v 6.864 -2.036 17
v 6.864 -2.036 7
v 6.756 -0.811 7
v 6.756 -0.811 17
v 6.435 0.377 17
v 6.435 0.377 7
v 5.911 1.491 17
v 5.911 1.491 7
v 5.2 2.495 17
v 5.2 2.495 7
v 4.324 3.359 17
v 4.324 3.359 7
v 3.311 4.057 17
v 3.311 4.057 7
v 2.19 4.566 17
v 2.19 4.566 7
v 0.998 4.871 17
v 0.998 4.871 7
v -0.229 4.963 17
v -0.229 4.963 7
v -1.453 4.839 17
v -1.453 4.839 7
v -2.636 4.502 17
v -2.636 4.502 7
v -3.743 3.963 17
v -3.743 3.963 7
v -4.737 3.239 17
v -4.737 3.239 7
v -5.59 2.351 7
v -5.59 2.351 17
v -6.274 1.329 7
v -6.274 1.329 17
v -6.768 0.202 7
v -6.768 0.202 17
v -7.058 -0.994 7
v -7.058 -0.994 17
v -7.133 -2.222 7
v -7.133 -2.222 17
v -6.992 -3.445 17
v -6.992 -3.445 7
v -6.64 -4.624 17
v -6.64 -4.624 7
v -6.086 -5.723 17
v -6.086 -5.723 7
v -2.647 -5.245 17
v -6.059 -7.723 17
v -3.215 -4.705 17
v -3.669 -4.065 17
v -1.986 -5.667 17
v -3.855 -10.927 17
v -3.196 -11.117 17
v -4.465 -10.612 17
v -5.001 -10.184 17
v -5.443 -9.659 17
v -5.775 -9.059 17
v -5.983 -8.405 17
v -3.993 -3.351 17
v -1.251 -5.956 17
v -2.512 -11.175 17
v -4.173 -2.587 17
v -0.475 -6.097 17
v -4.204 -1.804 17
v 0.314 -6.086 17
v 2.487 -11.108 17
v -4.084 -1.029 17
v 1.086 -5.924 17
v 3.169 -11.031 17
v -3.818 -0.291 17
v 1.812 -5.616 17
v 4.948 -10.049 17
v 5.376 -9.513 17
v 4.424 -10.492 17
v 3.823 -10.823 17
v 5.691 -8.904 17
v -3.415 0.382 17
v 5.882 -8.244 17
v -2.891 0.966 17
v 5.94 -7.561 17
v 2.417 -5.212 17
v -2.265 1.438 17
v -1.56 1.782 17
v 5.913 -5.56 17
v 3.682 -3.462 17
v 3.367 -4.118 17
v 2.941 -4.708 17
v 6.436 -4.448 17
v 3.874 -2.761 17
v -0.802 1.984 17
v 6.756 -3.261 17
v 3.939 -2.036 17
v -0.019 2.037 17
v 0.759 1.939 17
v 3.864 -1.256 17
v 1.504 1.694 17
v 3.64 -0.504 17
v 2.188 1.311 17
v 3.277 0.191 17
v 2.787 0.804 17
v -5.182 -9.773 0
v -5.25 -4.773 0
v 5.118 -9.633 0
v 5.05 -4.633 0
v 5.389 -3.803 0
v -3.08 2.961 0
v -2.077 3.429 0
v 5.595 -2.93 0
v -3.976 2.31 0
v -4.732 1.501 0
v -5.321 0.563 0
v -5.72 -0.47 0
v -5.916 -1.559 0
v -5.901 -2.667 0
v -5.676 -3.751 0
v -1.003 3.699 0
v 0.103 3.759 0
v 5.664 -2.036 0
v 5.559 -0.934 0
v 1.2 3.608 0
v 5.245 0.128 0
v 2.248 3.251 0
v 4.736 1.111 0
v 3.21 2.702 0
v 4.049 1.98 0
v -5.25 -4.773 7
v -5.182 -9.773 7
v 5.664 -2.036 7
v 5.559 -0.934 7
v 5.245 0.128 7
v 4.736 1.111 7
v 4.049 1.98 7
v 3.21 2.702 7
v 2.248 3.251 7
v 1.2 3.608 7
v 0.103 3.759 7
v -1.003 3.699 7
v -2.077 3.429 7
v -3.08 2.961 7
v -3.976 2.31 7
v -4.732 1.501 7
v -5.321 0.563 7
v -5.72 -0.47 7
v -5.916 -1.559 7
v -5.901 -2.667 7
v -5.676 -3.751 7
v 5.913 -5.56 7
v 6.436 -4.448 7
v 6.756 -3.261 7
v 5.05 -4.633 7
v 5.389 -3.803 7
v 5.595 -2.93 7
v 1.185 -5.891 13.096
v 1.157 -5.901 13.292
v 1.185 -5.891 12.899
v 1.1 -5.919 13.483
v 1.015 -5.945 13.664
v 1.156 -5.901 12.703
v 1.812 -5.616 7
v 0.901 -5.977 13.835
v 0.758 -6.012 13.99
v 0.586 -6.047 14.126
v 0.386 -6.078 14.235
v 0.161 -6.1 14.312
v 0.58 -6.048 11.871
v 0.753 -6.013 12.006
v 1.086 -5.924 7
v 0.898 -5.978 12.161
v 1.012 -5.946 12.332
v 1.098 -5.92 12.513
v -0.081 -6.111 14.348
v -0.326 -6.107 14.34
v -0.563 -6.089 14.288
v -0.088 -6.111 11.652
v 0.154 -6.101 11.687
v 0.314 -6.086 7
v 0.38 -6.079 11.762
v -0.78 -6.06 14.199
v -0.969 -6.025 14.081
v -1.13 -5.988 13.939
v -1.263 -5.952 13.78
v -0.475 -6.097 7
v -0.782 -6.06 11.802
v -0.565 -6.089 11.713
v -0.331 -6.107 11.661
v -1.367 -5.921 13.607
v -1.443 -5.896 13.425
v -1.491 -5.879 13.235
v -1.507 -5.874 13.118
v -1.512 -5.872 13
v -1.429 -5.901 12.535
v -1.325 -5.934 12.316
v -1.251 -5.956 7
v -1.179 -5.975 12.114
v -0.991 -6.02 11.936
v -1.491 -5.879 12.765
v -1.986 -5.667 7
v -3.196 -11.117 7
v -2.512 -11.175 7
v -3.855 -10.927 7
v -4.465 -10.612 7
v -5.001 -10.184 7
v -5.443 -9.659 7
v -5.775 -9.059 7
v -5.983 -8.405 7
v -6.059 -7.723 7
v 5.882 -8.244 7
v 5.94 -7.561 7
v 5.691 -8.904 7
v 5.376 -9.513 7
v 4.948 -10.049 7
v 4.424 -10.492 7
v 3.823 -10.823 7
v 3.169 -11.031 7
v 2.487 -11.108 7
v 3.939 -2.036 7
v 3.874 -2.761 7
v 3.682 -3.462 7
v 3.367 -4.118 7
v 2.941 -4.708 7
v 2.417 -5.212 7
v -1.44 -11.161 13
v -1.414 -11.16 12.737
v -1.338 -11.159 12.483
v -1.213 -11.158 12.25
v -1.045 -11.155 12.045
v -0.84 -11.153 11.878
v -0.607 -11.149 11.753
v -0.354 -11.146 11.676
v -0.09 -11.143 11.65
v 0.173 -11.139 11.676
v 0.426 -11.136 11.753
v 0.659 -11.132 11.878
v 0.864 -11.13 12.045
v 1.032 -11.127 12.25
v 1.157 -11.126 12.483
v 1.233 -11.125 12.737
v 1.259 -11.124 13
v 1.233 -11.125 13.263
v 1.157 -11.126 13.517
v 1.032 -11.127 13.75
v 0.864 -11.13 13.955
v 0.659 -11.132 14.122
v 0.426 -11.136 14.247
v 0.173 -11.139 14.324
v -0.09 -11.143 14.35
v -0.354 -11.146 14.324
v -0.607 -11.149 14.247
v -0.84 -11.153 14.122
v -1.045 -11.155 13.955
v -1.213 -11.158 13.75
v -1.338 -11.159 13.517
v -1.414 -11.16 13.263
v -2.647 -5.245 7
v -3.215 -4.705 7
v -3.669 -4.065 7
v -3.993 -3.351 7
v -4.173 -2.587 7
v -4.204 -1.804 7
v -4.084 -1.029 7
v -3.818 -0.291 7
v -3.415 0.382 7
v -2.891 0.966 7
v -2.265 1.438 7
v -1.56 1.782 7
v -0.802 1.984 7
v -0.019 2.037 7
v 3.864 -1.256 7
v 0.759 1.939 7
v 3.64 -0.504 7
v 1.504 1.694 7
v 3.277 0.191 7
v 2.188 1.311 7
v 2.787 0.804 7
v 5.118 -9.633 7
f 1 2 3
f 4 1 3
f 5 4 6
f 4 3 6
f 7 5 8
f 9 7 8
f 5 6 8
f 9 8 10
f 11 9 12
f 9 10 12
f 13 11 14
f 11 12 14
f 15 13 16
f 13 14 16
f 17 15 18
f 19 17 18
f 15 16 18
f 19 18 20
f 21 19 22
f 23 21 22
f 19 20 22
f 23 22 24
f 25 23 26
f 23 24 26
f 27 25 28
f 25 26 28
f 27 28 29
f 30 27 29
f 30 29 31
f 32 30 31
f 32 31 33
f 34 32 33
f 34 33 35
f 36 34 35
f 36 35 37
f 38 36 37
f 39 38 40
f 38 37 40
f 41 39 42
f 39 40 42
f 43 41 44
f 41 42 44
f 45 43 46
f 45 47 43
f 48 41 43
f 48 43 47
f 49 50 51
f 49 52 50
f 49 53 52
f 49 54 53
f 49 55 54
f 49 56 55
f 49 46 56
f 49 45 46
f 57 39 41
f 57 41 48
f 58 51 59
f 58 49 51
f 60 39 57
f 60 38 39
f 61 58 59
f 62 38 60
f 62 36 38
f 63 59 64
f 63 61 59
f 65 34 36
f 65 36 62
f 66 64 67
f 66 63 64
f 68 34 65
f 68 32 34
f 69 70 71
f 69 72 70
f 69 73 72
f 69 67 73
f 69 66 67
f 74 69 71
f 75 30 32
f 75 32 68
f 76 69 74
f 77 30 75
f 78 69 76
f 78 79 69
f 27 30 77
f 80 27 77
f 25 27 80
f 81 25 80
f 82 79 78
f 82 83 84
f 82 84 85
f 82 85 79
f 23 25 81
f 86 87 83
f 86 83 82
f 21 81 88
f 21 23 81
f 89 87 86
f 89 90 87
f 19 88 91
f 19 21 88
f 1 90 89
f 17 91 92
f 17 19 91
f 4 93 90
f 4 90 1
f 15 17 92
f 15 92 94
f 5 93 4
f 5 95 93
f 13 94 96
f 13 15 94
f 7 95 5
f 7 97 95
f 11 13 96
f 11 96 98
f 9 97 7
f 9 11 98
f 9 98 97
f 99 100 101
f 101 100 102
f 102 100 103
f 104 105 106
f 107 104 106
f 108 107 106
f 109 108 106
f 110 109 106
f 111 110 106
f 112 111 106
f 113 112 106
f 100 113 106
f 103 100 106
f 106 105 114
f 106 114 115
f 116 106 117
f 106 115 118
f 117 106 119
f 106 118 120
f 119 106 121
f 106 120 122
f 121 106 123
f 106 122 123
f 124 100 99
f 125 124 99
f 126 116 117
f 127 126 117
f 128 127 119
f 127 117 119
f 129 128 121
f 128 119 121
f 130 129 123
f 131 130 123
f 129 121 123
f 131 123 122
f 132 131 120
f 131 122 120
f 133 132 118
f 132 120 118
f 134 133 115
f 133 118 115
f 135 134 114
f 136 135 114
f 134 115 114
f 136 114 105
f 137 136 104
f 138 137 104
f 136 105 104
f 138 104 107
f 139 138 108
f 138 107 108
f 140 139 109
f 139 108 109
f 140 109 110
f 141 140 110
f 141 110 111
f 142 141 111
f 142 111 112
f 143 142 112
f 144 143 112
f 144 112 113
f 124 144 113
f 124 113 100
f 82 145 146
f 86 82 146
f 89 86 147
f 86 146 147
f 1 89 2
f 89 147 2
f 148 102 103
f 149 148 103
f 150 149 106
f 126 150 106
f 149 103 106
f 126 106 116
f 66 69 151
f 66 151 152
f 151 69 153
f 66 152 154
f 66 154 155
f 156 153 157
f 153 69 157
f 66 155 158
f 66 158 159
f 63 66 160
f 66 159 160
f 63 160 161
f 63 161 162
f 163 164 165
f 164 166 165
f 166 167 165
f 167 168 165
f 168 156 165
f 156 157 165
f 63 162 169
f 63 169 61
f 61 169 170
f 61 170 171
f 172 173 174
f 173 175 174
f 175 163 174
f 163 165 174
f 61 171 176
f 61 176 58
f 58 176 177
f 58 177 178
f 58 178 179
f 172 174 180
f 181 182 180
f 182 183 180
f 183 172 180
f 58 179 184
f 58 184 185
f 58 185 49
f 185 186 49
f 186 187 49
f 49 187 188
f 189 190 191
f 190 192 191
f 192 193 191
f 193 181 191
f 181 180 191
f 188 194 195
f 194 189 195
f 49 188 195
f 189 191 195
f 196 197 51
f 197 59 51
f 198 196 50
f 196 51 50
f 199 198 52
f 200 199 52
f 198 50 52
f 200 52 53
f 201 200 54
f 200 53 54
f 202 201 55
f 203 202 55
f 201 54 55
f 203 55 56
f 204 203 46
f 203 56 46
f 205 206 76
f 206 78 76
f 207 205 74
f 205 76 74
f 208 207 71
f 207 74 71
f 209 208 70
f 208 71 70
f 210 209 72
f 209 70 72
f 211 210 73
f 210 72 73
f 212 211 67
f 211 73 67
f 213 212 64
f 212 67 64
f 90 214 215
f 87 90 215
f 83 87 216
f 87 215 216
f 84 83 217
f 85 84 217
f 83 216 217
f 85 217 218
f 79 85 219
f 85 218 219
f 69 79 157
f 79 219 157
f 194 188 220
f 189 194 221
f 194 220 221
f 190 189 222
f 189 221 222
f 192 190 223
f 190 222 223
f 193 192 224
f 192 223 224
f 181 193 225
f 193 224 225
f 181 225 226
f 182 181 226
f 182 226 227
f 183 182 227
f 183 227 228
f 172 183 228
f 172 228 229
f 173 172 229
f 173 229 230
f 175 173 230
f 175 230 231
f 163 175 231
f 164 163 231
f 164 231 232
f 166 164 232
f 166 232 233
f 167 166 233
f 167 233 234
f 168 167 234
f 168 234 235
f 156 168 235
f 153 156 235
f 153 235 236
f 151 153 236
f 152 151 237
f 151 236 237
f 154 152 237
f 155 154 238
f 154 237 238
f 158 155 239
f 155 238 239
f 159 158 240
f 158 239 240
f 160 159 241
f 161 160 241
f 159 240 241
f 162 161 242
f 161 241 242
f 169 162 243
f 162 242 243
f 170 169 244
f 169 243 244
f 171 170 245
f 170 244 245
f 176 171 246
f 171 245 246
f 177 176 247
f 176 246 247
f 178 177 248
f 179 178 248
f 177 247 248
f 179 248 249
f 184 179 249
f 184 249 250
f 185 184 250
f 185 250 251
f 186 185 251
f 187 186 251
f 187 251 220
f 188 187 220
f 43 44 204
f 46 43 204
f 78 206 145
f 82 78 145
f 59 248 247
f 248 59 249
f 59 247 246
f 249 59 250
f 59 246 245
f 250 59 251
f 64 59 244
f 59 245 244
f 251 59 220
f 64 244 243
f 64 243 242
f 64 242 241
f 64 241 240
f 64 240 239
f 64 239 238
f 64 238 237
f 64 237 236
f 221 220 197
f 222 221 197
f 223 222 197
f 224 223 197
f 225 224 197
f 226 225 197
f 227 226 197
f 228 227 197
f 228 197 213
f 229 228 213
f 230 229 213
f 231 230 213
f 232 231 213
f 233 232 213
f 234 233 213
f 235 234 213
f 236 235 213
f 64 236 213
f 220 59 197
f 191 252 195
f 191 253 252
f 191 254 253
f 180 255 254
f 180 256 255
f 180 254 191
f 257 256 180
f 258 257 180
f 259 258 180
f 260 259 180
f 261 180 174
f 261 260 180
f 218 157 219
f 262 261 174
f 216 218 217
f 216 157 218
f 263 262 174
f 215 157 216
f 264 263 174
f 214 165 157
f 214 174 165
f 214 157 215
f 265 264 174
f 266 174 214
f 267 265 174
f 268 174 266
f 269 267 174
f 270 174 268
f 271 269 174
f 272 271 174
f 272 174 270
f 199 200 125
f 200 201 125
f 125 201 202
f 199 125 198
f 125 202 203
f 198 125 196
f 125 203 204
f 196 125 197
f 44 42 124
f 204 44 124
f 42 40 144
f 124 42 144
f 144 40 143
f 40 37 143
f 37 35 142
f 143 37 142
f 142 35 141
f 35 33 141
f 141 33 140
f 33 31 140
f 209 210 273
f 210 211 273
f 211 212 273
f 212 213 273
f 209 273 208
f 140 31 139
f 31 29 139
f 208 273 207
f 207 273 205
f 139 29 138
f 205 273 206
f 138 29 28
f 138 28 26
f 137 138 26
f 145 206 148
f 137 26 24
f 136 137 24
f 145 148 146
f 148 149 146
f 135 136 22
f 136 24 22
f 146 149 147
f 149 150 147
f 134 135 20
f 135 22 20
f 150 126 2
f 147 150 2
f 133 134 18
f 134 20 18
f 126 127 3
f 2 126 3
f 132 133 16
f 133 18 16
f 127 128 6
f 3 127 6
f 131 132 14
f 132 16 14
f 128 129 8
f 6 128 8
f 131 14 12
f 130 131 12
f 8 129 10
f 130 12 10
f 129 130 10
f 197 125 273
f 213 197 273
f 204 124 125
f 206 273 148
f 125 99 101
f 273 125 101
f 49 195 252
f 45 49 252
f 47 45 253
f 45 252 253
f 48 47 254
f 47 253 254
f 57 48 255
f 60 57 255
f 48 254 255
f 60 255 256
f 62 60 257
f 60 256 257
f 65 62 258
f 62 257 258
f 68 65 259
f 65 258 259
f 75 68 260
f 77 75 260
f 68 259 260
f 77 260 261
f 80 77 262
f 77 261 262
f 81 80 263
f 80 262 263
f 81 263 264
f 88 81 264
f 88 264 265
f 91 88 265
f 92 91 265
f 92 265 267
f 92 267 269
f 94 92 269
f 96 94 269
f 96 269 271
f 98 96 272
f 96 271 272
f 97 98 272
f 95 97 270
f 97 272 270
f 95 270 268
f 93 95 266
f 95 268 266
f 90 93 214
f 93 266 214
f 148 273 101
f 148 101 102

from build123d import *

# Parameters (mm, degrees)
BOSS_EXTRUDE1_DEPTH = 7
BOSS_EXTRUDE3_DEPTH = 10
SKETCH6_R           = 1.35
CUT_EXTRUDE3_DEPTH  = 12
FILLET1_R           = 3.5
FILLET2_R           = 3.5


with BuildPart() as part:
    # Sketch1 → Boss-Extrude1 (new body)
    with BuildSketch(Plane.XY):
        with BuildLine():
            ThreePointArc((5.050452833, -4.633288902), (-0.057176836, -7.835700867), (-5.249547167, -4.77259565))
            Line((-5.249547167, -4.77259565), (-5.181922533, -9.77259565))
            Line((-5.181922533, -9.77259565), (5.118077467, -9.633288902))
            Line((5.118077467, -9.633288902), (5.050452833, -4.633288902))
        make_face()
        with BuildLine():
            ThreePointArc((5.664385761, -2.036231273), (-1.546144107, 3.589638037), (-5.249547167, -4.77259565))
            Line((-5.249547167, -4.77259565), (5.050452833, -4.633288902))
            ThreePointArc((5.050452833, -4.633288902), (5.508816158, -3.370549635), (5.664385761, -2.036231273))
        make_face()
        with BuildLine():
            Line((5.050452833, -4.633288902), (-5.249547167, -4.77259565))
            ThreePointArc((-5.249547167, -4.77259565), (-0.057176836, -7.835700867), (5.050452833, -4.633288902))
        make_face()
    extrude(amount=BOSS_EXTRUDE1_DEPTH)

    # Sketch2 → Boss-Extrude3 (add)
    with BuildSketch(Plane.XY.offset(7)):
        with BuildLine():
            Line((5.063146119, -5.571799449), (5.912597424, -5.560310683))
            ThreePointArc((5.912597424, -5.560310683), (6.622250869, -3.861405013), (6.864385761, -2.036231273))
            ThreePointArc((6.864385761, -2.036231273), (-2.052012342, 4.696332749), (-6.086305185, -5.722594964))
            Line((-6.086305185, -5.722594964), (-5.236853881, -5.711106197))
            Line((-5.236853881, -5.711106197), (-5.249547167, -4.77259565))
            ThreePointArc((-5.249547167, -4.77259565), (-0.214051642, 3.763238321), (5.050452833, -4.633288902))
            Line((5.050452833, -4.633288902), (5.063146119, -5.571799449))
        make_face()
        with BuildLine():
            Line((1.811820806, -5.615773387), (5.063146119, -5.571799449))
            Line((5.063146119, -5.571799449), (5.050452833, -4.633288902))
            ThreePointArc((5.050452833, -4.633288902), (-0.214051642, 3.763238321), (-5.249547167, -4.77259565))
            Line((-5.249547167, -4.77259565), (-5.236853881, -5.711106197))
            Line((-5.236853881, -5.711106197), (-1.985528568, -5.66713226))
            ThreePointArc((-1.985528568, -5.66713226), (-2.264842281, 1.438248968), (3.939385761, -2.036231273))
            ThreePointArc((3.939385761, -2.036231273), (3.367343284, -4.118276805), (1.811820806, -5.615773387))
        make_face()
        with BuildLine():
            Line((5.078495254, -6.706676883), (5.063146119, -5.571799449))
            Line((5.063146119, -5.571799449), (1.811820806, -5.615773387))
            ThreePointArc((1.811820806, -5.615773387), (-0.080505202, -6.110858617), (-1.985528568, -5.66713226))
            Line((-1.985528568, -5.66713226), (-5.236853881, -5.711106197))
            Line((-5.236853881, -5.711106197), (-5.221504746, -6.845983631))
            ThreePointArc((-5.221504746, -6.845983631), (-0.040948408, -9.035591128), (5.078495254, -6.706676883))
        make_face()
        with BuildLine():
            Line((5.118077467, -9.633288902), (5.078495254, -6.706676883))
            ThreePointArc((5.078495254, -6.706676883), (-0.040948408, -9.035591128), (-5.221504746, -6.845983631))
            Line((-5.221504746, -6.845983631), (-5.181922533, -9.77259565))
            Line((-5.181922533, -9.77259565), (5.118077467, -9.633288902))
        make_face()
        with BuildLine():
            Line((5.986984522, -11.060310683), (5.912597424, -5.560310683))
            ThreePointArc((5.912597424, -5.560310683), (5.524642674, -6.154664432), (5.078495254, -6.706676883))
            Line((5.078495254, -6.706676883), (5.118077467, -9.633288902))
            Line((5.118077467, -9.633288902), (-5.181922533, -9.77259565))
            Line((-5.181922533, -9.77259565), (-5.221504746, -6.845983631))
            ThreePointArc((-5.221504746, -6.845983631), (-5.6824181, -6.30623911), (-6.086305185, -5.722594964))
            Line((-6.086305185, -5.722594964), (-6.011918087, -11.222594964))
            Line((-6.011918087, -11.222594964), (5.986984522, -11.060310683))
        make_face()
        with BuildLine():
            ThreePointArc((5.078495254, -6.706676883), (5.524642674, -6.154664432), (5.912597424, -5.560310683))
            Line((5.912597424, -5.560310683), (5.063146119, -5.571799449))
            Line((5.063146119, -5.571799449), (5.078495254, -6.706676883))
        make_face()
        with BuildLine():
            Line((-5.236853881, -5.711106197), (-6.086305185, -5.722594964))
            ThreePointArc((-6.086305185, -5.722594964), (-5.6824181, -6.30623911), (-5.221504746, -6.845983631))
            Line((-5.221504746, -6.845983631), (-5.236853881, -5.711106197))
        make_face()
    extrude(amount=BOSS_EXTRUDE3_DEPTH)

    # Sketch6 → Cut-Extrude3 (cut)
    with BuildSketch(Plane(origin=(0.150657496, -11.139246579, 0), x_dir=(-0.999908551, -0.01352369, 0), z_dir=(0.01352369, -0.999908551, 0))):
        with Locations((0.241163233, -13)):
            Circle(SKETCH6_R)
    extrude(amount=-CUT_EXTRUDE3_DEPTH, mode=Mode.SUBTRACT)

    # Fillet1
    fillet1_edges = [part.edges().sort_by_distance(p)[0] for p in [
        (5.986984522, -11.060310683, 12),
    ]]
    fillet(fillet1_edges, radius=FILLET1_R)

    # Fillet2
    fillet2_edges = [part.edges().sort_by_distance(p)[0] for p in [
        (-6.011918087, -11.222594964, 12),
    ]]
    fillet(fillet2_edges, radius=FILLET2_R)


solid = part.part
